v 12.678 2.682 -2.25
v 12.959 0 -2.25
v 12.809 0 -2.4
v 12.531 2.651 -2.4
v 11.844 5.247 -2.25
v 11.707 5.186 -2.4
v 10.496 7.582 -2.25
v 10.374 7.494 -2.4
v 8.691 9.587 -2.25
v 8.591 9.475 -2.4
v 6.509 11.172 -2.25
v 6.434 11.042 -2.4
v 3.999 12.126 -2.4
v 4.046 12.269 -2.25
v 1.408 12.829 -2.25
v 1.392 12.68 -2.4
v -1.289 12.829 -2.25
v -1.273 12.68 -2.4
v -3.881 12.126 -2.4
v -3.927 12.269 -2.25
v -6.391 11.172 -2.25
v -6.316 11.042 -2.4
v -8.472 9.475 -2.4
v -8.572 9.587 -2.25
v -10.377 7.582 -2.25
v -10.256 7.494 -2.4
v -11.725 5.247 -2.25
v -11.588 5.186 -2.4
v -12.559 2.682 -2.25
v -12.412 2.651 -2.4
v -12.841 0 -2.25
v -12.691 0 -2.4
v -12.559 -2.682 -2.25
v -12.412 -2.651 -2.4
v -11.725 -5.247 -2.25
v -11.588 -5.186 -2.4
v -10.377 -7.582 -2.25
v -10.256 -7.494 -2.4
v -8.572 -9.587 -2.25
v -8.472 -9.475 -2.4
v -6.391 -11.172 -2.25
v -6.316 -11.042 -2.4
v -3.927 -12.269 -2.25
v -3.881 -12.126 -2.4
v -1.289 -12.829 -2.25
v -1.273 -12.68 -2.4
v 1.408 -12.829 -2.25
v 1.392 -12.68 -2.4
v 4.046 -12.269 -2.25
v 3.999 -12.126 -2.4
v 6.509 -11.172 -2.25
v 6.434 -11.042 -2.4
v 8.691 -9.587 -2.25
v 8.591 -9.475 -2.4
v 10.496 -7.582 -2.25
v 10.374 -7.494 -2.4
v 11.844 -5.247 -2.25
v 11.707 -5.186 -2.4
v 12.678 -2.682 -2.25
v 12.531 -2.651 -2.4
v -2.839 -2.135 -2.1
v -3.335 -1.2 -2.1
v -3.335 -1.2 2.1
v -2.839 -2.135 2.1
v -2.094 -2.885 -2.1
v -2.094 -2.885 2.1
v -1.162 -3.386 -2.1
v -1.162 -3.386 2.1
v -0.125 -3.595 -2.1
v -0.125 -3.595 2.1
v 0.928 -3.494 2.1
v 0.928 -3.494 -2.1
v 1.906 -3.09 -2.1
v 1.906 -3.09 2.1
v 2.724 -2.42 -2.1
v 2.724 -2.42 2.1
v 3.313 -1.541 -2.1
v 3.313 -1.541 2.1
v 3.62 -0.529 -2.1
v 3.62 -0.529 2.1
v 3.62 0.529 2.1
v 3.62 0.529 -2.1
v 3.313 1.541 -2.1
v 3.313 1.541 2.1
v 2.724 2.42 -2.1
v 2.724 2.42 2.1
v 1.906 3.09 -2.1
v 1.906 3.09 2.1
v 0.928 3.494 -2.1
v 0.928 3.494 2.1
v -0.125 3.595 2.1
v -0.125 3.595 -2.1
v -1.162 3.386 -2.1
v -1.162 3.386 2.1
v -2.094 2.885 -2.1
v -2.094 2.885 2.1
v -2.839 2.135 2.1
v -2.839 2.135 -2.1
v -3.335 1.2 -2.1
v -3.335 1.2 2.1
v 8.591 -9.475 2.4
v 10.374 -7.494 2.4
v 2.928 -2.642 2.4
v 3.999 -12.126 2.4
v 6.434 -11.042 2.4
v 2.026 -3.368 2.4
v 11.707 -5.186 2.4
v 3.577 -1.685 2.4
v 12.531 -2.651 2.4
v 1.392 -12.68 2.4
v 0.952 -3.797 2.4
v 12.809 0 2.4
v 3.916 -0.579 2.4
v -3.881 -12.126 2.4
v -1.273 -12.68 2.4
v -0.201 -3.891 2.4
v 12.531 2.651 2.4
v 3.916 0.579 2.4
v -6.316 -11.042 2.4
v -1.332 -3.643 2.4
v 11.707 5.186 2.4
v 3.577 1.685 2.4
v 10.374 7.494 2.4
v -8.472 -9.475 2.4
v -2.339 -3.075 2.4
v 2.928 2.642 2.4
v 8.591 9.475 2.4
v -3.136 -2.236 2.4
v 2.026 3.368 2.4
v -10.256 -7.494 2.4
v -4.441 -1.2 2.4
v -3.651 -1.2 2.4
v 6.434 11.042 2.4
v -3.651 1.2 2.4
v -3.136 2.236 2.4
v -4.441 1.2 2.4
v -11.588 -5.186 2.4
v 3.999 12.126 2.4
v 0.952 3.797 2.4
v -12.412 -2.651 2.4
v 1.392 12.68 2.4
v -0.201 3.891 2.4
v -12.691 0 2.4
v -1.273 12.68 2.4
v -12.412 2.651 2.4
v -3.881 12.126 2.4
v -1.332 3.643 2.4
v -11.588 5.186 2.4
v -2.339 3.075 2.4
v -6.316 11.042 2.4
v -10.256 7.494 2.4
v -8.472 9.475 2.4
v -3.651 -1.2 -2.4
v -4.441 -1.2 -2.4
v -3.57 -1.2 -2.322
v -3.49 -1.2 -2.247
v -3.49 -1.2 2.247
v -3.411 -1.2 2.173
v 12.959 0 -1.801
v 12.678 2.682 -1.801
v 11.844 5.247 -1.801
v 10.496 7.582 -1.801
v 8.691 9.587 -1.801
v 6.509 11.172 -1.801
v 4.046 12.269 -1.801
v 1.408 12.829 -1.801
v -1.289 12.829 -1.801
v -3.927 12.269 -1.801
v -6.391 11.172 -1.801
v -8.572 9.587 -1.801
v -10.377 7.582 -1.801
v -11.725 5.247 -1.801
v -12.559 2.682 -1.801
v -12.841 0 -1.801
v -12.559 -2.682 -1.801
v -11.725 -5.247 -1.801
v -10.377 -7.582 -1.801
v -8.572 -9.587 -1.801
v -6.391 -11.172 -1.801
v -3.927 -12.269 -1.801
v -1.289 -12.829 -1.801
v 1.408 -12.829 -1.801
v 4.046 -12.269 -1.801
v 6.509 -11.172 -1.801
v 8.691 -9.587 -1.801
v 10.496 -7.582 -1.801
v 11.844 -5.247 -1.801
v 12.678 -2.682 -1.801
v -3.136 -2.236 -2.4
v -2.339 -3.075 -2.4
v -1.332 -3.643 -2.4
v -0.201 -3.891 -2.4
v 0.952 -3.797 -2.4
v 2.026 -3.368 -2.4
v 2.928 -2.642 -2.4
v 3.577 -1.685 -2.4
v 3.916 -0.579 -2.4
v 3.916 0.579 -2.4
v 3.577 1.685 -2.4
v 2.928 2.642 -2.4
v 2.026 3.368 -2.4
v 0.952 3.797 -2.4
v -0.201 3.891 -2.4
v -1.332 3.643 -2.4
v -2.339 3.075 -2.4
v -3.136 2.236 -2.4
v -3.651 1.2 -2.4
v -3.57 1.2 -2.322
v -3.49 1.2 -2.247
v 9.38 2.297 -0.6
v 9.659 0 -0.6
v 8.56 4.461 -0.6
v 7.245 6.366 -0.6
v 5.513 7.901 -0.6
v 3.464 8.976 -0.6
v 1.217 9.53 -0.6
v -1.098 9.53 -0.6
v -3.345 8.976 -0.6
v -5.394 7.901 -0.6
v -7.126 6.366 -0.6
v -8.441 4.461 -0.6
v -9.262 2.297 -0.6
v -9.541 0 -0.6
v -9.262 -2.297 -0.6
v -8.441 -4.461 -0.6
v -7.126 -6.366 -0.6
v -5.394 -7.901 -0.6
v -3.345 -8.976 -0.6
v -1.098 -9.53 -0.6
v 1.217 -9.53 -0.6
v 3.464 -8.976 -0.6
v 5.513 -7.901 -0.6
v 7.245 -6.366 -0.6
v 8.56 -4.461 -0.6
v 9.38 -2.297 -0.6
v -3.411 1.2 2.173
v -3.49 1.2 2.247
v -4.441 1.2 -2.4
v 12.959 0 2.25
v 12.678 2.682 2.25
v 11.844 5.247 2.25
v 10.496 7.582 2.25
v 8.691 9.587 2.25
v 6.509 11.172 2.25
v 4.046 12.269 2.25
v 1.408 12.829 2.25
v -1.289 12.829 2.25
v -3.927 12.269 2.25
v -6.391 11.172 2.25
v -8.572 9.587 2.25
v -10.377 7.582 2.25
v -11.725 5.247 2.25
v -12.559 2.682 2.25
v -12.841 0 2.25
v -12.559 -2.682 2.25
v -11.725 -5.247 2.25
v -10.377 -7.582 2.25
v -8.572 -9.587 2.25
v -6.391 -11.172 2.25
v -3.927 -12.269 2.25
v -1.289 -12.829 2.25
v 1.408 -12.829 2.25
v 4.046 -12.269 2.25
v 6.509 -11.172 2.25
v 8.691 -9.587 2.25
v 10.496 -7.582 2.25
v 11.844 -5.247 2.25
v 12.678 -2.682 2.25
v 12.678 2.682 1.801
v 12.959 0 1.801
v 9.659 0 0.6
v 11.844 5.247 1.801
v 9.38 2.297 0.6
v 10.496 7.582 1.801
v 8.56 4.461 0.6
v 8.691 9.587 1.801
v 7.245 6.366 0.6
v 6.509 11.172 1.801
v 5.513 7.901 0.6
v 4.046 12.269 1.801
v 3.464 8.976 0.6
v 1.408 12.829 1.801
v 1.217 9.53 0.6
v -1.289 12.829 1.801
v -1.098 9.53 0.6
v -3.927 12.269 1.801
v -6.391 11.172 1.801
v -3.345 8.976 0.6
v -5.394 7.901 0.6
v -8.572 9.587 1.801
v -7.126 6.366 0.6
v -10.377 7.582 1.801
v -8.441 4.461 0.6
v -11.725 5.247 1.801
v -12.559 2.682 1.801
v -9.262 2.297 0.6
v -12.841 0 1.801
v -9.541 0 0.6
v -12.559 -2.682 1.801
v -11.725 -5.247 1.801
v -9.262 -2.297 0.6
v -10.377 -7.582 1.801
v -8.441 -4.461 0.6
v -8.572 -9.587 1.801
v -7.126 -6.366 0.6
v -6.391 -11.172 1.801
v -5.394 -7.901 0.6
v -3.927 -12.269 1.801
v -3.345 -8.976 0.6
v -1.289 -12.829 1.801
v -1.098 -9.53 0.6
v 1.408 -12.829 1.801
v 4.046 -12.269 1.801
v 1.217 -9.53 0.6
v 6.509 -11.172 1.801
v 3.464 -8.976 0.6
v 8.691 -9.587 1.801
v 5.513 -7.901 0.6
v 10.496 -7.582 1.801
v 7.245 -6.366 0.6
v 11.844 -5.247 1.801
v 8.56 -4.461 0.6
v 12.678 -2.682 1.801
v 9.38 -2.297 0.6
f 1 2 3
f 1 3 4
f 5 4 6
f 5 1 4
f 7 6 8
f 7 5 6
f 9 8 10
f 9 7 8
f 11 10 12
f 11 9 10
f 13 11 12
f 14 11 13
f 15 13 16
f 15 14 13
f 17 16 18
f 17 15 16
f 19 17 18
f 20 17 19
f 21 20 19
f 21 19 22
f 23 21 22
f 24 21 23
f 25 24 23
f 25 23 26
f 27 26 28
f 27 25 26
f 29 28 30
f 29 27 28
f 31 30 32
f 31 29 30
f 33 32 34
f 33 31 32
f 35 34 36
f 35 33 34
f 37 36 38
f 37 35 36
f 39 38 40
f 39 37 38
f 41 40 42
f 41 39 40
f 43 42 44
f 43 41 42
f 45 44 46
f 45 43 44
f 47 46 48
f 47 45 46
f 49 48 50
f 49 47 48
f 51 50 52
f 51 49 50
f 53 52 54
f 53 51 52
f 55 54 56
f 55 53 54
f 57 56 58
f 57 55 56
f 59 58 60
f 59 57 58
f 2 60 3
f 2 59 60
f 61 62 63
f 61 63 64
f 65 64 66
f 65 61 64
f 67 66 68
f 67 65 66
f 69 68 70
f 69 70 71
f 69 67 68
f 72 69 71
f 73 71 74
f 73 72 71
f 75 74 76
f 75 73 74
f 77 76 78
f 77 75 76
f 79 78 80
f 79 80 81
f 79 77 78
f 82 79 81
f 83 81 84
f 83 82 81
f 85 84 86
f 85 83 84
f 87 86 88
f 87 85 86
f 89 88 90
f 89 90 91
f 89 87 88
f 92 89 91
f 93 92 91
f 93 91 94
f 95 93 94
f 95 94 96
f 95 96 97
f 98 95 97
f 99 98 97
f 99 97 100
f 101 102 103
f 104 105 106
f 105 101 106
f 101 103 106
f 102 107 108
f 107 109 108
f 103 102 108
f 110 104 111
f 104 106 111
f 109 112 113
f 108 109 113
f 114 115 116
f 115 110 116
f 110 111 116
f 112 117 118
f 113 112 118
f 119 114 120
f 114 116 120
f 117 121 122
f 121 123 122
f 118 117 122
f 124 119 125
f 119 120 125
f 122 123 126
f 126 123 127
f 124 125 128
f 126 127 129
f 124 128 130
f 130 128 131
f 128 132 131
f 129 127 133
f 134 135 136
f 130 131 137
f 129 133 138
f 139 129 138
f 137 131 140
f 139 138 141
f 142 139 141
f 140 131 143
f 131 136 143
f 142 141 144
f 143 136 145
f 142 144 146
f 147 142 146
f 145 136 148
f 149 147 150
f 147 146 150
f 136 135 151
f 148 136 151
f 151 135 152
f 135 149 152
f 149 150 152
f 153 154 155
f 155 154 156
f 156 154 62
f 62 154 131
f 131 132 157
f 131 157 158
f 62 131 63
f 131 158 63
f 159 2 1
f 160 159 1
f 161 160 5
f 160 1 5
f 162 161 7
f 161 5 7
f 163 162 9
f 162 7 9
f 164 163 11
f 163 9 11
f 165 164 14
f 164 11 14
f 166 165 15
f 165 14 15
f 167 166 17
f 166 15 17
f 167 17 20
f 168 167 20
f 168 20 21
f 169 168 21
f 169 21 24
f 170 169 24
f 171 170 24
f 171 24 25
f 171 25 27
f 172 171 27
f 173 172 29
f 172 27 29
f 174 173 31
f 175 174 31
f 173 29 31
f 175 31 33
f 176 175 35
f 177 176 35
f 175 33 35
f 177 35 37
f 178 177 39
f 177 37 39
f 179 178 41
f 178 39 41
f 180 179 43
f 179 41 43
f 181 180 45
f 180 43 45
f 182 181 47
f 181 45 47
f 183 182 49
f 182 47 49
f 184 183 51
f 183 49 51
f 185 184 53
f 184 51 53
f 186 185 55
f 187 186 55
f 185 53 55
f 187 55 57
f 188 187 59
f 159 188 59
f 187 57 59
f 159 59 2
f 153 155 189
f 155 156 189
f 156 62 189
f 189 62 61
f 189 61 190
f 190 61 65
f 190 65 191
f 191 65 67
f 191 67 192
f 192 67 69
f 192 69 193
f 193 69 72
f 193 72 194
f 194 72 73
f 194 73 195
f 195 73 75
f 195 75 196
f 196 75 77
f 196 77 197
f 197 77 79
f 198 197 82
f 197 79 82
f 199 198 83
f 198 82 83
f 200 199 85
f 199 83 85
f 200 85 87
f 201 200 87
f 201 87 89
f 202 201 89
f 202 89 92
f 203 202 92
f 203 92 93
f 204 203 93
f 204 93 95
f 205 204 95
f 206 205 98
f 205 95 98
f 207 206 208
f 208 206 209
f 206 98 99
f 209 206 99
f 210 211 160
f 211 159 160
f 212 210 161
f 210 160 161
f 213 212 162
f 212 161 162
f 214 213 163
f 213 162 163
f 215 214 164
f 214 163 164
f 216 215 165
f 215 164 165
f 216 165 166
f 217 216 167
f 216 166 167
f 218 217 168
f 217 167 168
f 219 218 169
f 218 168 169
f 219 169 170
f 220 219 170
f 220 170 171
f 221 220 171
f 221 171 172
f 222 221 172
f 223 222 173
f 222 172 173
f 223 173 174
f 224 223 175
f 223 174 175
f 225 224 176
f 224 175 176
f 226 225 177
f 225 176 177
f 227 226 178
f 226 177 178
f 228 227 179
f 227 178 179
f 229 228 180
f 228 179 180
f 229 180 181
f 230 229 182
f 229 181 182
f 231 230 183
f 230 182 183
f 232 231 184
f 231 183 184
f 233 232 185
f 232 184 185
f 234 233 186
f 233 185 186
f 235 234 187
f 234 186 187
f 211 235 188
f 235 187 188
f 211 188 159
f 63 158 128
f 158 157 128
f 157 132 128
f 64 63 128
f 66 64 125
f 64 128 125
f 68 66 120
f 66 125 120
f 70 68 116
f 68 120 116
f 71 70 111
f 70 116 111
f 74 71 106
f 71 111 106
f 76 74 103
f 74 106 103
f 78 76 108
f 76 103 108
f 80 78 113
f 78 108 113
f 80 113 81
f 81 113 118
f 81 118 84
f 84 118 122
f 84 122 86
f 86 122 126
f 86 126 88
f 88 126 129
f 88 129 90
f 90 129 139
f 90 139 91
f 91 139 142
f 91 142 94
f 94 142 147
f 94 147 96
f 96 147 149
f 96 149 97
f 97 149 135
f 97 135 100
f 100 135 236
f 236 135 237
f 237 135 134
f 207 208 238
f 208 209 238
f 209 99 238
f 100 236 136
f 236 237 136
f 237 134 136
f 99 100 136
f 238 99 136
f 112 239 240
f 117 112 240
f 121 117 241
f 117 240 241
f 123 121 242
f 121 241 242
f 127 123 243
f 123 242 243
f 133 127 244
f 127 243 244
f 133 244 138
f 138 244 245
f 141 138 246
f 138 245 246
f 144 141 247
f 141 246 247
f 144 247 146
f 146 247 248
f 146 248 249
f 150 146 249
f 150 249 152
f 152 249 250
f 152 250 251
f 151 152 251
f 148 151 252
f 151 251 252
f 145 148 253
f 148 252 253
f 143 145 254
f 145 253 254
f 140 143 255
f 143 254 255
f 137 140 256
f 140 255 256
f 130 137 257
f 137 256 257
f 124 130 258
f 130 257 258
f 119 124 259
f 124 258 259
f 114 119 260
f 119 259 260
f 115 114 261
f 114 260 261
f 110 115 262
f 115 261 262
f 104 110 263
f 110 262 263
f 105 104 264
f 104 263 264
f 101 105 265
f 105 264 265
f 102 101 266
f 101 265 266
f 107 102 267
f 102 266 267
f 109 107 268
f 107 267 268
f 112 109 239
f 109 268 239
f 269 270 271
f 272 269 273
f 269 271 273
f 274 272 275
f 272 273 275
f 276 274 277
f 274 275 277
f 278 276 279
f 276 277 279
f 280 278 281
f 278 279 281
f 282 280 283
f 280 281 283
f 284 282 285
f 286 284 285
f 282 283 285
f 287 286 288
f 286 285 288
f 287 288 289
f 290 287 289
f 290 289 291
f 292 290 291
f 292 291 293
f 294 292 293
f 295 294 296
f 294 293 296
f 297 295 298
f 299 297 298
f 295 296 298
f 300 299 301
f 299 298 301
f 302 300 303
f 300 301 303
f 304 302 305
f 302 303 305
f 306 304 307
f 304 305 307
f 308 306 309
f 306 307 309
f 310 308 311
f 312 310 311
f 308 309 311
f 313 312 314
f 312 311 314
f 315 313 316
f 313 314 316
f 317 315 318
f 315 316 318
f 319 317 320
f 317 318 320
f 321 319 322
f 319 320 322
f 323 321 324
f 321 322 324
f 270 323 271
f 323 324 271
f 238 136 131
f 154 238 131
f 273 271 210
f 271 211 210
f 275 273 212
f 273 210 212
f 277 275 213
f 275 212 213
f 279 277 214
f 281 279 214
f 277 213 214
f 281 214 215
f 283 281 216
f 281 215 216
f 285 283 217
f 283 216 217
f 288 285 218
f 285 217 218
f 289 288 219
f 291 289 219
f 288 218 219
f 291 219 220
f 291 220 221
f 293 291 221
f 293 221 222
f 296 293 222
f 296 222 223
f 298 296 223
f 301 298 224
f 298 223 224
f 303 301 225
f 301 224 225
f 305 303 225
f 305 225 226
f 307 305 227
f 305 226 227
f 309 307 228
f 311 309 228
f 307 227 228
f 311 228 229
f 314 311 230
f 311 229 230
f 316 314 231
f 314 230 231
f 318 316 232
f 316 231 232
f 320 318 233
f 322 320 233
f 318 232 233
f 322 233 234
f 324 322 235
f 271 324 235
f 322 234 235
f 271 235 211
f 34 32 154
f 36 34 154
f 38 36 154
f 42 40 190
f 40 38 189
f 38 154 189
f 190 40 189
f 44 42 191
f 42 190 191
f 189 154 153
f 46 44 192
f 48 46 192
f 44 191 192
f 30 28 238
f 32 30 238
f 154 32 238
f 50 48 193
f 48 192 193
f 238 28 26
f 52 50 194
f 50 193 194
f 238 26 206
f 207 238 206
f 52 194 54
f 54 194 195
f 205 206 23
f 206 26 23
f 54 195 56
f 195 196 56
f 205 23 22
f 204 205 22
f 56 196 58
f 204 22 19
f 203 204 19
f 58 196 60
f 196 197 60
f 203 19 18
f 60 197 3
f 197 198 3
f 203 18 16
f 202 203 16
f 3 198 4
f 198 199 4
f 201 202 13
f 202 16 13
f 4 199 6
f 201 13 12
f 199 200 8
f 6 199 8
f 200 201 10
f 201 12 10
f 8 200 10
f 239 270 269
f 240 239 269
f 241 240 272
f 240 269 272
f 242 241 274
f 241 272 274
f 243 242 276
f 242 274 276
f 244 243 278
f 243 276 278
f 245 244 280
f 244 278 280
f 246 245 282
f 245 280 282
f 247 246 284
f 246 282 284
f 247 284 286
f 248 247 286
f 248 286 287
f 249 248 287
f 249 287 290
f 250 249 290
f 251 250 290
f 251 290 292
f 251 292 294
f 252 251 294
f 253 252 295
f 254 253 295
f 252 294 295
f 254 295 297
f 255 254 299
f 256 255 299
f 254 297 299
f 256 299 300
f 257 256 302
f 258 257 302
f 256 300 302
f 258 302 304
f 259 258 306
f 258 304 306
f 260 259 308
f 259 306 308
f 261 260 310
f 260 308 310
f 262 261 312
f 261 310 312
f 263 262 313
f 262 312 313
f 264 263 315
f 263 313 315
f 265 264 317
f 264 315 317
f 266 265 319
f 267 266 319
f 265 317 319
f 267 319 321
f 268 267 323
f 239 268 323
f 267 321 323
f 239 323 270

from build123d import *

# Parameters (mm, degrees)
CUT_EXTRUDE1_DEPTH = 17
SKETCH3_W          = 12
SKETCH3_H          = 16
CHAMFER1_SIZE2     = 1.000000021
CHAMFER1_SIZE      = 1.000000018
CHAMFER2_SIZE      = 0.5
SCALE1_SCALE       = 0.3


with BuildPart() as part:
    # Sketch1 → Revolve1 (revolve)
    with BuildSketch(Plane(origin=(0, 0, 0), x_dir=(1, 0, 0), z_dir=(0, 1, 0))):
        Polygon((43, 8), (0, 8), (0, -8), (43, -8), (43, -6.003672577), (32, -2), (32, 2), (43, 6.003672577), align=None)
    revolve(axis=Axis((0, 0, -8), (0, 0, 1)))

    # Sketch2 → Cut-Extrude1 (cut, through all)
    with BuildSketch(Plane.XY.offset(8)):
        with BuildLine():
            Line((-15, -4), (-11.313708499, -4))
            ThreePointArc((-11.313708499, -4), (-12, -1e-09), (-11.313708499, 3.999999999))
            Line((-11.313708499, 3.999999999), (-15, 3.999999999))
            Line((-15, 3.999999999), (-15, -4))
        make_face()
    extrude(amount=-CUT_EXTRUDE1_DEPTH, mode=Mode.SUBTRACT)

    # Sketch3 → Cut-Revolve1 (revolve, cut)
    with BuildSketch(Plane(origin=(0, 0, 0), x_dir=(1, 0, 0), z_dir=(0, 1, 0))):
        with Locations((6, 0)):
            Rectangle(SKETCH3_W, SKETCH3_H)
    revolve(axis=Axis((0, 0, -8), (0, 0, 1)), mode=Mode.SUBTRACT)

    # Chamfer1
    chamfer1_edges = [part.edges().sort_by_distance(p)[0] for p in [
        (12, 1e-09, -8),
        (12, 1e-09, 8),
    ]]
    chamfer(chamfer1_edges, length=CHAMFER1_SIZE, length2=CHAMFER1_SIZE2)

    # Chamfer2
    chamfer2_edges = [part.edges().sort_by_distance(p)[0] for p in [
        (-43, 0, 8),
        (-43, 0, -8),
    ]]
    chamfer(chamfer2_edges, length=CHAMFER2_SIZE)


with BuildPart() as part_1:
    # Scale1: scaled about (0.084922045, 0, 0)
    add(part.part.scale(SCALE1_SCALE).moved(Location((0.059445431, 0, 0))))


solid = part_1.part
